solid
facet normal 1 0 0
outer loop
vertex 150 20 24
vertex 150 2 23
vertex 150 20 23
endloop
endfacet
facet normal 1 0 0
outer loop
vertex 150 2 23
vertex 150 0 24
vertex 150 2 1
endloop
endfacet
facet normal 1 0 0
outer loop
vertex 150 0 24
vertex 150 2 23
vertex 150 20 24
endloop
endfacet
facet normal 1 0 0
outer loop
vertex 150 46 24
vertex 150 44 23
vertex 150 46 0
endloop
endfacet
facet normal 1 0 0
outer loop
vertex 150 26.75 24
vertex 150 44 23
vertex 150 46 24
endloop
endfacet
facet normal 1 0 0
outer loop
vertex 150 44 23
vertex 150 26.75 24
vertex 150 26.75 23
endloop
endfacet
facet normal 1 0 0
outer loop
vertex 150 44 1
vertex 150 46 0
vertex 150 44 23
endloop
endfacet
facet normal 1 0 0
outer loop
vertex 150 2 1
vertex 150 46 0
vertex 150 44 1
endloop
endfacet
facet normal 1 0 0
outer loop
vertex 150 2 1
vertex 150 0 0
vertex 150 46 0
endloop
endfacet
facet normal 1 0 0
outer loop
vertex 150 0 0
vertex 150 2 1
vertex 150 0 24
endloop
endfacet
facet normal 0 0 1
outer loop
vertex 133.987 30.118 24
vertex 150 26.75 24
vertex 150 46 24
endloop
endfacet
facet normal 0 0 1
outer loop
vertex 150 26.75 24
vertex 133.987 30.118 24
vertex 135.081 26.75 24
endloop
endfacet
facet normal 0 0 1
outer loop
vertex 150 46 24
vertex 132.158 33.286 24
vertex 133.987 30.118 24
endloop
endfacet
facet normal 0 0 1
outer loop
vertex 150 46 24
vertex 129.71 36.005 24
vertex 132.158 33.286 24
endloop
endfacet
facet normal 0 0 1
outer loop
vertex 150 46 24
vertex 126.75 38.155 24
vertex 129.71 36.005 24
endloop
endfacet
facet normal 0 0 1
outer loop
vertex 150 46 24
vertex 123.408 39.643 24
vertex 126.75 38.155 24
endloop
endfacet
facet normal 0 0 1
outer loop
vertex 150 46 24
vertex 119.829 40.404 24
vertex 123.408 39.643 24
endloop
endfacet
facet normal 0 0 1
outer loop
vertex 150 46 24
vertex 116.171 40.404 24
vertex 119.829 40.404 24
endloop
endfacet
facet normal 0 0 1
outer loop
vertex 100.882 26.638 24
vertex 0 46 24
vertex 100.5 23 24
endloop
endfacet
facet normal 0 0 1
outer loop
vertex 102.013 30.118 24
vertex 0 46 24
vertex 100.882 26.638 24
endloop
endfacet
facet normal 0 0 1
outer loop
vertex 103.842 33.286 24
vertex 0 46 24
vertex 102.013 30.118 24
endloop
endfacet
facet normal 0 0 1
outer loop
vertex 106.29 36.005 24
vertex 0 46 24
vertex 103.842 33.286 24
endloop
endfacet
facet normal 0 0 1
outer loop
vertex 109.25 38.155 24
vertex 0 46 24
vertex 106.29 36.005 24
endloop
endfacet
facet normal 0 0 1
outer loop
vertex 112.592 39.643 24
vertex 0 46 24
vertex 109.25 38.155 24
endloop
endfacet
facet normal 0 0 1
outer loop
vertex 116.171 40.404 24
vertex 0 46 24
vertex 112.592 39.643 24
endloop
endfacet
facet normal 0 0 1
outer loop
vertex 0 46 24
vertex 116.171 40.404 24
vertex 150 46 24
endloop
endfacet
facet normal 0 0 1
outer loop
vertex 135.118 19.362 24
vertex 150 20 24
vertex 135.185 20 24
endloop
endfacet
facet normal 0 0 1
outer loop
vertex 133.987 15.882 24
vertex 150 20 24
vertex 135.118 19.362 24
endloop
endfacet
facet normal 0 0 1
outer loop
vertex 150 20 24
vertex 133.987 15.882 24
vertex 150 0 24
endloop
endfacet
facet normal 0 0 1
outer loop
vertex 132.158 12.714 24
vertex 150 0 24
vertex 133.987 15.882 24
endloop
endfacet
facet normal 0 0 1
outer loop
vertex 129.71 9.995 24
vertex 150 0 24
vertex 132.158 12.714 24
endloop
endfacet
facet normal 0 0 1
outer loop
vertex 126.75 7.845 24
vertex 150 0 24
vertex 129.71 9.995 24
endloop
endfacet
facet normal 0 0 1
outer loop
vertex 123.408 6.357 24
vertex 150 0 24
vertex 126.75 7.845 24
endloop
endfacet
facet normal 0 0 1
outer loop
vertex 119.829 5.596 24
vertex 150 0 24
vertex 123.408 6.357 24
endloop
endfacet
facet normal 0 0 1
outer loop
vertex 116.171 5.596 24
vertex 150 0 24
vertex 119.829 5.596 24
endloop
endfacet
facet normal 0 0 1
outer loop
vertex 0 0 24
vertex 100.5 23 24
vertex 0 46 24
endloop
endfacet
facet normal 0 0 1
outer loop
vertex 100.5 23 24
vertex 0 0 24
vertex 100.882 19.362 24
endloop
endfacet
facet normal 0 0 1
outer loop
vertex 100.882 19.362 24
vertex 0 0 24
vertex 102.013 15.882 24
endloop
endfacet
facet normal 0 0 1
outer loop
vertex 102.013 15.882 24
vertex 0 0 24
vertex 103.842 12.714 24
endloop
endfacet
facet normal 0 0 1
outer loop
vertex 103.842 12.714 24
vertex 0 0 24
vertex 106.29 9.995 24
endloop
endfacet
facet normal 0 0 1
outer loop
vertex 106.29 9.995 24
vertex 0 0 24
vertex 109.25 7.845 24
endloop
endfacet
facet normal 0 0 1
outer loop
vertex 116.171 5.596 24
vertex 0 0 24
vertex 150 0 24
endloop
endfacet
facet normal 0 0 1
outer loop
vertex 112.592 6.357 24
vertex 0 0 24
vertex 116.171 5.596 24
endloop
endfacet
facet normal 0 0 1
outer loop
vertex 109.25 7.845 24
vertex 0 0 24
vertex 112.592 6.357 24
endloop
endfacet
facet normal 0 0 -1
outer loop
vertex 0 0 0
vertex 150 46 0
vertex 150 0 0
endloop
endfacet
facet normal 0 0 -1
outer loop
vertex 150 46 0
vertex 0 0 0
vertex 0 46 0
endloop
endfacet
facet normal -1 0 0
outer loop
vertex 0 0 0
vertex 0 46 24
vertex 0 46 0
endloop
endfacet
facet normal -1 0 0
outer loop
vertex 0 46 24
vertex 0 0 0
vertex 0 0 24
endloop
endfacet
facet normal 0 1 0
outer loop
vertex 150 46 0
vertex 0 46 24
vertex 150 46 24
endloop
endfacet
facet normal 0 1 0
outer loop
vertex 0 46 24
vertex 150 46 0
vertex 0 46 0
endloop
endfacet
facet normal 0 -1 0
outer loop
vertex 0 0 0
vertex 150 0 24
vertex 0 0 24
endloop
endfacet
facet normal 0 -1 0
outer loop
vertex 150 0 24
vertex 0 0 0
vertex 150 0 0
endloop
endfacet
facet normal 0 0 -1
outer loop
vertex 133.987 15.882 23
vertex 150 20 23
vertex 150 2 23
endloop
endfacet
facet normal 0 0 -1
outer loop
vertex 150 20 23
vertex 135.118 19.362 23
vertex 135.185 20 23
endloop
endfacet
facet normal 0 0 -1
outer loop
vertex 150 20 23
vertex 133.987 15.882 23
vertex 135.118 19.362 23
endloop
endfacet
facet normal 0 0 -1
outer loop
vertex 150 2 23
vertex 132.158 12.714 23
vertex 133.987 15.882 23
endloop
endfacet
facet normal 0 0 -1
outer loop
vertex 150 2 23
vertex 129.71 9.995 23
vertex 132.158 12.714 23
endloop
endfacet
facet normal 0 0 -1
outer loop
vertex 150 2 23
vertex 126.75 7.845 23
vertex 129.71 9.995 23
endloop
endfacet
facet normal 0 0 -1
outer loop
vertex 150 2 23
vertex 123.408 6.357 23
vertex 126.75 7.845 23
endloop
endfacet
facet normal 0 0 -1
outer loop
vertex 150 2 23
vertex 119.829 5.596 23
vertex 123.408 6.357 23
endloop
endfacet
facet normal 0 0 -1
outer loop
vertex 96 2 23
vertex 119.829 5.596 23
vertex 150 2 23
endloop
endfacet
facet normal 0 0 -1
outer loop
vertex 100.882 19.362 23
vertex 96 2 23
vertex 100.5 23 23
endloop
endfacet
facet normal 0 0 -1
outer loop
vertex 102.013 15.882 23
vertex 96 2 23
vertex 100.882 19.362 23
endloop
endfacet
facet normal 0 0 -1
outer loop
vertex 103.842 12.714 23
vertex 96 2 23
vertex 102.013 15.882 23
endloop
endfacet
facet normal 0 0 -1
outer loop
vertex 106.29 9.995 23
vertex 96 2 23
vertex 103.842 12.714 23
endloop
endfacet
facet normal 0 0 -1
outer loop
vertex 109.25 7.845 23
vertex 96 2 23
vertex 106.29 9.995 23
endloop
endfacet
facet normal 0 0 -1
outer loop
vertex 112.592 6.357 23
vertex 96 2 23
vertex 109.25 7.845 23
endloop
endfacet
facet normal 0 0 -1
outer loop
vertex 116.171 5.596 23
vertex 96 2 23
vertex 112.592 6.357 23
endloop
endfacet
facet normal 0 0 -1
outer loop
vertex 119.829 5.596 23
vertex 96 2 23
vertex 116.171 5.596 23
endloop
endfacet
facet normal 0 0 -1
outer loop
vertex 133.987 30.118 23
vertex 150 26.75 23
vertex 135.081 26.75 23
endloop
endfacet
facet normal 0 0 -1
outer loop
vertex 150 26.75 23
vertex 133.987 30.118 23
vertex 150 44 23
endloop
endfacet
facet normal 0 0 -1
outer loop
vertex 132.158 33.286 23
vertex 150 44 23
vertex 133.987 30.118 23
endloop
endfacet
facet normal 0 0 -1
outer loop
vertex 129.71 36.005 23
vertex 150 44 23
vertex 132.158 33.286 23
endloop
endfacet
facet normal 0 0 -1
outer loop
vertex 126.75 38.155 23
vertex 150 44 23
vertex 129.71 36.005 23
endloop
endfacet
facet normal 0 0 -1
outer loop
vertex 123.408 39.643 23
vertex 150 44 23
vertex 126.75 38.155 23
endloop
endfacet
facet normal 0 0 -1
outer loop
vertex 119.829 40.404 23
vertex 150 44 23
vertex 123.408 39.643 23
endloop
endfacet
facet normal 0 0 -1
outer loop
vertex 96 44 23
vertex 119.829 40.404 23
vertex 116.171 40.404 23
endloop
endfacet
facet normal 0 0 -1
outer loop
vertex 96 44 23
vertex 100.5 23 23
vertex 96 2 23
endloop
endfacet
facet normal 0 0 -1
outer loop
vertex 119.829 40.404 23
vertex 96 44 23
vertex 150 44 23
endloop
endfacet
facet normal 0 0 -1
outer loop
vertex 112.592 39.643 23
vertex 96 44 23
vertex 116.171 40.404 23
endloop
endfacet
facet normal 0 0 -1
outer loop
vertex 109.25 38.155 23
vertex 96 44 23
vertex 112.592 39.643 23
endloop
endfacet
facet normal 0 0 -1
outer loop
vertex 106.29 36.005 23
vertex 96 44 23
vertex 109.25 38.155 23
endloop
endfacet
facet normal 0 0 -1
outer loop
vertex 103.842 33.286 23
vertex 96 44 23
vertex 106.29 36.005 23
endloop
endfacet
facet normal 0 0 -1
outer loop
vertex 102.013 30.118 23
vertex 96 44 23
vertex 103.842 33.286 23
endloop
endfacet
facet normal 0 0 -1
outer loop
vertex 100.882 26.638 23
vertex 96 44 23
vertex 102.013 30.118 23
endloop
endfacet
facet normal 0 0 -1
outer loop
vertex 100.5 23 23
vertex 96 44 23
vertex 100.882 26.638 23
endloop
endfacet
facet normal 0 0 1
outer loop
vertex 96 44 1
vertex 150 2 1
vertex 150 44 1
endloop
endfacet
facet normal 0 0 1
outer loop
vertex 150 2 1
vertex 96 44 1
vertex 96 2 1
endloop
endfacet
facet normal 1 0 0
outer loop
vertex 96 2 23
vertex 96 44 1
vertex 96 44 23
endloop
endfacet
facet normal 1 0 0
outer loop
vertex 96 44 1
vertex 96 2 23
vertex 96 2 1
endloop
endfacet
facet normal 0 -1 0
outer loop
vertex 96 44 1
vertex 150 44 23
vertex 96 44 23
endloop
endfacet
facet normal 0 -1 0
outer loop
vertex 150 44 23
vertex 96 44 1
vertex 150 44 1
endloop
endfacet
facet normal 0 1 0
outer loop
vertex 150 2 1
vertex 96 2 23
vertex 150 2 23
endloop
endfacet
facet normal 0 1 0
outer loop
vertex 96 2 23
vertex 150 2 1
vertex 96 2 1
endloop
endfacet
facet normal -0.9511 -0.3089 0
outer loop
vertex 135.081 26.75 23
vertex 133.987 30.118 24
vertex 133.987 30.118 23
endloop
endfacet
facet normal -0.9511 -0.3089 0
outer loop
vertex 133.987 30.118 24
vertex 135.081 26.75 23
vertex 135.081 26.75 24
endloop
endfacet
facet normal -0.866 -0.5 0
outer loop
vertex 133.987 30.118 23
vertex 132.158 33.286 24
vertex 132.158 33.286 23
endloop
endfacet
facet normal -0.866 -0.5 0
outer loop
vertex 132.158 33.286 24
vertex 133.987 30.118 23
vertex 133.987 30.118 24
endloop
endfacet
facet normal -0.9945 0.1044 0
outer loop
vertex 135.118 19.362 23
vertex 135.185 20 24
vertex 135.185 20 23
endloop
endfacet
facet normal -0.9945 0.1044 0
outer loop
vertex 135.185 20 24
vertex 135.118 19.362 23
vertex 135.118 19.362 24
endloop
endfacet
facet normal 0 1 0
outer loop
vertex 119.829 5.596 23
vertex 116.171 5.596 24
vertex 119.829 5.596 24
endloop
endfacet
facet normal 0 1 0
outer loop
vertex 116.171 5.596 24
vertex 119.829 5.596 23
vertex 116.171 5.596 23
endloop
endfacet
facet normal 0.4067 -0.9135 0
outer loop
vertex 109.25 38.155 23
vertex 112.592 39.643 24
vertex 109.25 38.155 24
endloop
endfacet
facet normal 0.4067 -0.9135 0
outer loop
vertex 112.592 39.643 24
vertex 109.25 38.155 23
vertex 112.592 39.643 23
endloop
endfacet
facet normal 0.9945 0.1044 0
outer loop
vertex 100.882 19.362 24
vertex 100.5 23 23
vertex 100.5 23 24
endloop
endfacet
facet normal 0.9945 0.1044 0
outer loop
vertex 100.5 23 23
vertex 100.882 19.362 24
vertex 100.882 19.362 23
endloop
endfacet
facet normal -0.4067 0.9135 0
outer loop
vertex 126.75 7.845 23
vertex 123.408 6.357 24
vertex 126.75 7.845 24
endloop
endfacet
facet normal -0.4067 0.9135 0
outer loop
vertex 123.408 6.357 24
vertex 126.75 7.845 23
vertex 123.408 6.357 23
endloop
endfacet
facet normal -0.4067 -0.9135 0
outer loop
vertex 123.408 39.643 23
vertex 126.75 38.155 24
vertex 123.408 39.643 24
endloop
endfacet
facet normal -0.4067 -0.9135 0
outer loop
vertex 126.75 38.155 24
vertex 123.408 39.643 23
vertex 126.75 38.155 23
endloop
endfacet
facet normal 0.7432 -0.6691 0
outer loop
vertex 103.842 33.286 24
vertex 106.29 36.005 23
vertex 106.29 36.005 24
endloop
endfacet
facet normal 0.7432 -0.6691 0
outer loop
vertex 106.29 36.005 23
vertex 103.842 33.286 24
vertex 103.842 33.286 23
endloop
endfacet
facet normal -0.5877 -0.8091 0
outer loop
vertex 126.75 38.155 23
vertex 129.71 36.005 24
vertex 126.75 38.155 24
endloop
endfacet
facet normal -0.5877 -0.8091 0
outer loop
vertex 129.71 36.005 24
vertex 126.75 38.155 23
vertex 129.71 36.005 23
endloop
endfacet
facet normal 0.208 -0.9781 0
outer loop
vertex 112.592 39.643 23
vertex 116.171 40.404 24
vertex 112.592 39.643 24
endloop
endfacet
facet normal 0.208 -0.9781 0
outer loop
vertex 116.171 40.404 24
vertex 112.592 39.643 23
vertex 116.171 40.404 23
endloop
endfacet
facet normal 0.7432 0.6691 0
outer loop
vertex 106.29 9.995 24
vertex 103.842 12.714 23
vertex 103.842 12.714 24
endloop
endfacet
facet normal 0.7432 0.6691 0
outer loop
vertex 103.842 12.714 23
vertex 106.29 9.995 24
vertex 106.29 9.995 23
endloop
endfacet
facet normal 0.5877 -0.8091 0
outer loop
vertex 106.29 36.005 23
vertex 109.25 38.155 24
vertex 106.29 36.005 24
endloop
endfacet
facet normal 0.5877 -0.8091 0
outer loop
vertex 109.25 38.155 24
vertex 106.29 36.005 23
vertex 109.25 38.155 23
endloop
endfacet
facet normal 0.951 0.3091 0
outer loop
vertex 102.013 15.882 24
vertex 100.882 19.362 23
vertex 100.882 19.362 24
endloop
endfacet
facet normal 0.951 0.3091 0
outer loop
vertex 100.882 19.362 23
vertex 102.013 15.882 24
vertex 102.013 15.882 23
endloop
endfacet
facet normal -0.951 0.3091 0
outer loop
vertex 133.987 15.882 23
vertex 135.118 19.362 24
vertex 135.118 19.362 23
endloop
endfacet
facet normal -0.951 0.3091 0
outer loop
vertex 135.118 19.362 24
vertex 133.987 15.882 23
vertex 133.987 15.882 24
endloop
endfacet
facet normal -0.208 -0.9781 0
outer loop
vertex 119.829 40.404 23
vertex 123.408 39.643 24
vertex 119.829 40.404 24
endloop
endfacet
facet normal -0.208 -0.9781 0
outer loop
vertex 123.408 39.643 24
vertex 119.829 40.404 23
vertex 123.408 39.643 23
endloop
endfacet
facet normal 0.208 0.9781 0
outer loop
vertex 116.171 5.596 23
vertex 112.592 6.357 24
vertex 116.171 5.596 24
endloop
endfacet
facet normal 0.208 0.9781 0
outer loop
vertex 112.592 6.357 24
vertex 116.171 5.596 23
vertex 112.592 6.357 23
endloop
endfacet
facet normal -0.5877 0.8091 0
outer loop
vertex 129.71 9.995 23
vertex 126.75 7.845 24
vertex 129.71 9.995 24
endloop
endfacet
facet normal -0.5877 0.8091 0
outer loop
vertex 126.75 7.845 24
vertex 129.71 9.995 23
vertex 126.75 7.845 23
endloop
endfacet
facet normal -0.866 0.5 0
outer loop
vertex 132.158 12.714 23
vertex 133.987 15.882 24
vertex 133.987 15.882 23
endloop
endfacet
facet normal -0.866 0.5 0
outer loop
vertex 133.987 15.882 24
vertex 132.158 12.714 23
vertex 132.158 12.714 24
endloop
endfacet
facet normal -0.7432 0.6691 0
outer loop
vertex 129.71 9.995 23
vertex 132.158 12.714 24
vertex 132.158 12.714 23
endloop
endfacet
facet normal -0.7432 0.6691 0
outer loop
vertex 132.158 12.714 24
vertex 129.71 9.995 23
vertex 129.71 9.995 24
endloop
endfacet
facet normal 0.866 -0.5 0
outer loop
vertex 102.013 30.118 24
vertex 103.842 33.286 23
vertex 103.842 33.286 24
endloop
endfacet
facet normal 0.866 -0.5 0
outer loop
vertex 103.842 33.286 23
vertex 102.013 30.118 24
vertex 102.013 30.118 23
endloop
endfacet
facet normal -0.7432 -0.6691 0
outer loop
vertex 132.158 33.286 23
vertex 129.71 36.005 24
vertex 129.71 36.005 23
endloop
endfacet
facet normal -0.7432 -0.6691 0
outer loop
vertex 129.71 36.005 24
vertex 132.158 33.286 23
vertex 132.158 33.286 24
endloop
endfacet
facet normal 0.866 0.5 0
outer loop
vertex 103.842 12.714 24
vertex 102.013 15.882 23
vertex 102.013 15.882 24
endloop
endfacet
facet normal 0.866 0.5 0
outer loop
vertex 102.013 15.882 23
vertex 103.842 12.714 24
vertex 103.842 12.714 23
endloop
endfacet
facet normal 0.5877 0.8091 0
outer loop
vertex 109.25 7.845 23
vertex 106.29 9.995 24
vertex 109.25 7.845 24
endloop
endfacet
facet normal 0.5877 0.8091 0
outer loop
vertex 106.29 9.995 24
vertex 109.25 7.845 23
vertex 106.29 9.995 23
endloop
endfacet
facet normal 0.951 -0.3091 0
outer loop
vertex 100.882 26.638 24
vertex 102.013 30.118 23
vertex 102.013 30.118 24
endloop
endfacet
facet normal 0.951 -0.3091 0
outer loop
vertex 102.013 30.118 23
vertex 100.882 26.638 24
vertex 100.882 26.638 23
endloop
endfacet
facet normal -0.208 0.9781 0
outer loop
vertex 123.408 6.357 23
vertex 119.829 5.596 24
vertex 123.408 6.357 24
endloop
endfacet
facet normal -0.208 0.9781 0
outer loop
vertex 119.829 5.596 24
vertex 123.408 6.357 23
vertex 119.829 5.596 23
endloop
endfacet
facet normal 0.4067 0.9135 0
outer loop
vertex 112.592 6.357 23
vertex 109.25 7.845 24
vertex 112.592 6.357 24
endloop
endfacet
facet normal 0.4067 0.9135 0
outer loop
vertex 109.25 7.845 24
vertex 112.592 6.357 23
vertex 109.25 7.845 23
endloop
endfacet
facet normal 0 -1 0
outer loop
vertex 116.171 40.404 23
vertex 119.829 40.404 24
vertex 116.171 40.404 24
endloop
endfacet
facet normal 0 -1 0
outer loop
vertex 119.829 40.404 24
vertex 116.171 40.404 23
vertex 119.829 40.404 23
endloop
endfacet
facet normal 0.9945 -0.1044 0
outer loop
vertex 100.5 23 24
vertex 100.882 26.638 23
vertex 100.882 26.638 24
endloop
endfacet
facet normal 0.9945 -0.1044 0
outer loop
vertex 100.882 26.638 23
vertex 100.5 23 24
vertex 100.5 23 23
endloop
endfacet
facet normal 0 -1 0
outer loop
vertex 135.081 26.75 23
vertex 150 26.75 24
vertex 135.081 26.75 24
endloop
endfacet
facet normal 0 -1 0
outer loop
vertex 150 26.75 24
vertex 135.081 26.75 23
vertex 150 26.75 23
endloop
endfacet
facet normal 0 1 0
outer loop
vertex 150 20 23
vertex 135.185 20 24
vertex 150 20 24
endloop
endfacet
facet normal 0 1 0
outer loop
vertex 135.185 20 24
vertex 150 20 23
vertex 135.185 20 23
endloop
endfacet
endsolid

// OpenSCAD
charger_width = 42;
charger_depth = 54;
charger_height = 22;

charger_dongle_diameter = 6;
charger_dongle_distance_from_back = 35 - charger_dongle_diameter;

width = 150;
depth = charger_width + 4;
height = 120;

module bottom() {
    difference() {
        cube([width, depth, charger_height + 2]);
        translate([
            width - charger_depth,
            2,
            1
        ]) cube([charger_depth, charger_width, charger_height]);
        translate([
            width - charger_dongle_distance_from_back - 3,
            depth / 2,
            charger_height
        ]) cylinder(d=35, h=2);
        translate([
            width - charger_dongle_distance_from_back,
            (depth - charger_dongle_diameter) / 2,
            charger_height + 1
        ]) cube([charger_dongle_distance_from_back, charger_dongle_diameter+0.75, 2]);
    }
}

bottom();
